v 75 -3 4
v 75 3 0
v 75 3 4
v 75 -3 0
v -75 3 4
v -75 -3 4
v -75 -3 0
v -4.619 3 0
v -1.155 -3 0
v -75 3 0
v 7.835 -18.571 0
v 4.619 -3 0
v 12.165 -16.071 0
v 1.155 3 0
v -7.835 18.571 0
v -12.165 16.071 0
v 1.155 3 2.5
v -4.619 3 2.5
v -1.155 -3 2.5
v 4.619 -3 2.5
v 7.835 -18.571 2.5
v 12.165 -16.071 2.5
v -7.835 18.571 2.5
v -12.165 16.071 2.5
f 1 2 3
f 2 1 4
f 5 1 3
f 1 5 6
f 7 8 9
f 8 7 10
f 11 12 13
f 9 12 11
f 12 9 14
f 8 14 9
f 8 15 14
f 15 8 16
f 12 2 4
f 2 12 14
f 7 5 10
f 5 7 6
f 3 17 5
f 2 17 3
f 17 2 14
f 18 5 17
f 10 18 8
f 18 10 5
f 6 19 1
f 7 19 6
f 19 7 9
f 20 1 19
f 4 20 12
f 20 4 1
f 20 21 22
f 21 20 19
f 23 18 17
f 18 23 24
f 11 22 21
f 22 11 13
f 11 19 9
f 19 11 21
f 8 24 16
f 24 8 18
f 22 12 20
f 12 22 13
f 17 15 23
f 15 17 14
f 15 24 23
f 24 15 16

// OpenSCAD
// L-shaped (hockey-stick) cell spreader, printed flat on the XY plane.
// All dimensions in millimetres.

$fn = 64;

// Handle (long bar, +X direction)
handle_len   = 150;   // length along +X
handle_w     = 6;     // width in Y
handle_t     = 4;     // thickness in Z (0..4)

// Spreading foot (thin bar, 120 deg CCW from +X)
foot_len     = 40;    // length along its axis
foot_w       = 5;     // width in Y (local)
foot_t       = 2.5;   // thickness in Z (0..2.5)
foot_angle   = 120;   // degrees CCW from +X, seen from above

// Round boss at the origin joining the bars
boss_d       = 6;     // diameter
boss_t       = 4;     // height (0..4)

// Hanging hole through the handle
hole_d       = 4;     // diameter
hole_x       = 143;   // centre X position on the handle

// ---- Handle: x = 0..150, y = -3..3, z = 0..4 ----
module handle() { translate([-handle_len/2, -handle_w/2, 0])
    cube([handle_len, handle_w, handle_t]); }

// ---- Spreading foot: 40 mm bar rotated 120 deg about Z, z = 0..2.5 ----
module foot() { rotate([0, 0, foot_angle])
    translate([-foot_len/2, -foot_w/2, 0])
    cube([foot_len, foot_w, foot_t]); }

// ---- Round boss at the origin (centred on origin) ----
module boss() { cylinder(h = boss_t, d = boss_d, $fn = $fn); }

// ---- Hanging hole: 4 mm through the handle at x = 143, y = 0 ----
// Cut cylinder extends 1 mm past each face of the 4 mm-thick handle.
module hole() { translate([hole_x, 0, -1])
    cylinder(h = handle_t + 2, d = hole_d, $fn = $fn); }

// ---- Assemble: union of the three solids, then subtract the hole ----
difference() {
    union() {
        handle();
        foot();
        boss();
    }
    hole();
}
